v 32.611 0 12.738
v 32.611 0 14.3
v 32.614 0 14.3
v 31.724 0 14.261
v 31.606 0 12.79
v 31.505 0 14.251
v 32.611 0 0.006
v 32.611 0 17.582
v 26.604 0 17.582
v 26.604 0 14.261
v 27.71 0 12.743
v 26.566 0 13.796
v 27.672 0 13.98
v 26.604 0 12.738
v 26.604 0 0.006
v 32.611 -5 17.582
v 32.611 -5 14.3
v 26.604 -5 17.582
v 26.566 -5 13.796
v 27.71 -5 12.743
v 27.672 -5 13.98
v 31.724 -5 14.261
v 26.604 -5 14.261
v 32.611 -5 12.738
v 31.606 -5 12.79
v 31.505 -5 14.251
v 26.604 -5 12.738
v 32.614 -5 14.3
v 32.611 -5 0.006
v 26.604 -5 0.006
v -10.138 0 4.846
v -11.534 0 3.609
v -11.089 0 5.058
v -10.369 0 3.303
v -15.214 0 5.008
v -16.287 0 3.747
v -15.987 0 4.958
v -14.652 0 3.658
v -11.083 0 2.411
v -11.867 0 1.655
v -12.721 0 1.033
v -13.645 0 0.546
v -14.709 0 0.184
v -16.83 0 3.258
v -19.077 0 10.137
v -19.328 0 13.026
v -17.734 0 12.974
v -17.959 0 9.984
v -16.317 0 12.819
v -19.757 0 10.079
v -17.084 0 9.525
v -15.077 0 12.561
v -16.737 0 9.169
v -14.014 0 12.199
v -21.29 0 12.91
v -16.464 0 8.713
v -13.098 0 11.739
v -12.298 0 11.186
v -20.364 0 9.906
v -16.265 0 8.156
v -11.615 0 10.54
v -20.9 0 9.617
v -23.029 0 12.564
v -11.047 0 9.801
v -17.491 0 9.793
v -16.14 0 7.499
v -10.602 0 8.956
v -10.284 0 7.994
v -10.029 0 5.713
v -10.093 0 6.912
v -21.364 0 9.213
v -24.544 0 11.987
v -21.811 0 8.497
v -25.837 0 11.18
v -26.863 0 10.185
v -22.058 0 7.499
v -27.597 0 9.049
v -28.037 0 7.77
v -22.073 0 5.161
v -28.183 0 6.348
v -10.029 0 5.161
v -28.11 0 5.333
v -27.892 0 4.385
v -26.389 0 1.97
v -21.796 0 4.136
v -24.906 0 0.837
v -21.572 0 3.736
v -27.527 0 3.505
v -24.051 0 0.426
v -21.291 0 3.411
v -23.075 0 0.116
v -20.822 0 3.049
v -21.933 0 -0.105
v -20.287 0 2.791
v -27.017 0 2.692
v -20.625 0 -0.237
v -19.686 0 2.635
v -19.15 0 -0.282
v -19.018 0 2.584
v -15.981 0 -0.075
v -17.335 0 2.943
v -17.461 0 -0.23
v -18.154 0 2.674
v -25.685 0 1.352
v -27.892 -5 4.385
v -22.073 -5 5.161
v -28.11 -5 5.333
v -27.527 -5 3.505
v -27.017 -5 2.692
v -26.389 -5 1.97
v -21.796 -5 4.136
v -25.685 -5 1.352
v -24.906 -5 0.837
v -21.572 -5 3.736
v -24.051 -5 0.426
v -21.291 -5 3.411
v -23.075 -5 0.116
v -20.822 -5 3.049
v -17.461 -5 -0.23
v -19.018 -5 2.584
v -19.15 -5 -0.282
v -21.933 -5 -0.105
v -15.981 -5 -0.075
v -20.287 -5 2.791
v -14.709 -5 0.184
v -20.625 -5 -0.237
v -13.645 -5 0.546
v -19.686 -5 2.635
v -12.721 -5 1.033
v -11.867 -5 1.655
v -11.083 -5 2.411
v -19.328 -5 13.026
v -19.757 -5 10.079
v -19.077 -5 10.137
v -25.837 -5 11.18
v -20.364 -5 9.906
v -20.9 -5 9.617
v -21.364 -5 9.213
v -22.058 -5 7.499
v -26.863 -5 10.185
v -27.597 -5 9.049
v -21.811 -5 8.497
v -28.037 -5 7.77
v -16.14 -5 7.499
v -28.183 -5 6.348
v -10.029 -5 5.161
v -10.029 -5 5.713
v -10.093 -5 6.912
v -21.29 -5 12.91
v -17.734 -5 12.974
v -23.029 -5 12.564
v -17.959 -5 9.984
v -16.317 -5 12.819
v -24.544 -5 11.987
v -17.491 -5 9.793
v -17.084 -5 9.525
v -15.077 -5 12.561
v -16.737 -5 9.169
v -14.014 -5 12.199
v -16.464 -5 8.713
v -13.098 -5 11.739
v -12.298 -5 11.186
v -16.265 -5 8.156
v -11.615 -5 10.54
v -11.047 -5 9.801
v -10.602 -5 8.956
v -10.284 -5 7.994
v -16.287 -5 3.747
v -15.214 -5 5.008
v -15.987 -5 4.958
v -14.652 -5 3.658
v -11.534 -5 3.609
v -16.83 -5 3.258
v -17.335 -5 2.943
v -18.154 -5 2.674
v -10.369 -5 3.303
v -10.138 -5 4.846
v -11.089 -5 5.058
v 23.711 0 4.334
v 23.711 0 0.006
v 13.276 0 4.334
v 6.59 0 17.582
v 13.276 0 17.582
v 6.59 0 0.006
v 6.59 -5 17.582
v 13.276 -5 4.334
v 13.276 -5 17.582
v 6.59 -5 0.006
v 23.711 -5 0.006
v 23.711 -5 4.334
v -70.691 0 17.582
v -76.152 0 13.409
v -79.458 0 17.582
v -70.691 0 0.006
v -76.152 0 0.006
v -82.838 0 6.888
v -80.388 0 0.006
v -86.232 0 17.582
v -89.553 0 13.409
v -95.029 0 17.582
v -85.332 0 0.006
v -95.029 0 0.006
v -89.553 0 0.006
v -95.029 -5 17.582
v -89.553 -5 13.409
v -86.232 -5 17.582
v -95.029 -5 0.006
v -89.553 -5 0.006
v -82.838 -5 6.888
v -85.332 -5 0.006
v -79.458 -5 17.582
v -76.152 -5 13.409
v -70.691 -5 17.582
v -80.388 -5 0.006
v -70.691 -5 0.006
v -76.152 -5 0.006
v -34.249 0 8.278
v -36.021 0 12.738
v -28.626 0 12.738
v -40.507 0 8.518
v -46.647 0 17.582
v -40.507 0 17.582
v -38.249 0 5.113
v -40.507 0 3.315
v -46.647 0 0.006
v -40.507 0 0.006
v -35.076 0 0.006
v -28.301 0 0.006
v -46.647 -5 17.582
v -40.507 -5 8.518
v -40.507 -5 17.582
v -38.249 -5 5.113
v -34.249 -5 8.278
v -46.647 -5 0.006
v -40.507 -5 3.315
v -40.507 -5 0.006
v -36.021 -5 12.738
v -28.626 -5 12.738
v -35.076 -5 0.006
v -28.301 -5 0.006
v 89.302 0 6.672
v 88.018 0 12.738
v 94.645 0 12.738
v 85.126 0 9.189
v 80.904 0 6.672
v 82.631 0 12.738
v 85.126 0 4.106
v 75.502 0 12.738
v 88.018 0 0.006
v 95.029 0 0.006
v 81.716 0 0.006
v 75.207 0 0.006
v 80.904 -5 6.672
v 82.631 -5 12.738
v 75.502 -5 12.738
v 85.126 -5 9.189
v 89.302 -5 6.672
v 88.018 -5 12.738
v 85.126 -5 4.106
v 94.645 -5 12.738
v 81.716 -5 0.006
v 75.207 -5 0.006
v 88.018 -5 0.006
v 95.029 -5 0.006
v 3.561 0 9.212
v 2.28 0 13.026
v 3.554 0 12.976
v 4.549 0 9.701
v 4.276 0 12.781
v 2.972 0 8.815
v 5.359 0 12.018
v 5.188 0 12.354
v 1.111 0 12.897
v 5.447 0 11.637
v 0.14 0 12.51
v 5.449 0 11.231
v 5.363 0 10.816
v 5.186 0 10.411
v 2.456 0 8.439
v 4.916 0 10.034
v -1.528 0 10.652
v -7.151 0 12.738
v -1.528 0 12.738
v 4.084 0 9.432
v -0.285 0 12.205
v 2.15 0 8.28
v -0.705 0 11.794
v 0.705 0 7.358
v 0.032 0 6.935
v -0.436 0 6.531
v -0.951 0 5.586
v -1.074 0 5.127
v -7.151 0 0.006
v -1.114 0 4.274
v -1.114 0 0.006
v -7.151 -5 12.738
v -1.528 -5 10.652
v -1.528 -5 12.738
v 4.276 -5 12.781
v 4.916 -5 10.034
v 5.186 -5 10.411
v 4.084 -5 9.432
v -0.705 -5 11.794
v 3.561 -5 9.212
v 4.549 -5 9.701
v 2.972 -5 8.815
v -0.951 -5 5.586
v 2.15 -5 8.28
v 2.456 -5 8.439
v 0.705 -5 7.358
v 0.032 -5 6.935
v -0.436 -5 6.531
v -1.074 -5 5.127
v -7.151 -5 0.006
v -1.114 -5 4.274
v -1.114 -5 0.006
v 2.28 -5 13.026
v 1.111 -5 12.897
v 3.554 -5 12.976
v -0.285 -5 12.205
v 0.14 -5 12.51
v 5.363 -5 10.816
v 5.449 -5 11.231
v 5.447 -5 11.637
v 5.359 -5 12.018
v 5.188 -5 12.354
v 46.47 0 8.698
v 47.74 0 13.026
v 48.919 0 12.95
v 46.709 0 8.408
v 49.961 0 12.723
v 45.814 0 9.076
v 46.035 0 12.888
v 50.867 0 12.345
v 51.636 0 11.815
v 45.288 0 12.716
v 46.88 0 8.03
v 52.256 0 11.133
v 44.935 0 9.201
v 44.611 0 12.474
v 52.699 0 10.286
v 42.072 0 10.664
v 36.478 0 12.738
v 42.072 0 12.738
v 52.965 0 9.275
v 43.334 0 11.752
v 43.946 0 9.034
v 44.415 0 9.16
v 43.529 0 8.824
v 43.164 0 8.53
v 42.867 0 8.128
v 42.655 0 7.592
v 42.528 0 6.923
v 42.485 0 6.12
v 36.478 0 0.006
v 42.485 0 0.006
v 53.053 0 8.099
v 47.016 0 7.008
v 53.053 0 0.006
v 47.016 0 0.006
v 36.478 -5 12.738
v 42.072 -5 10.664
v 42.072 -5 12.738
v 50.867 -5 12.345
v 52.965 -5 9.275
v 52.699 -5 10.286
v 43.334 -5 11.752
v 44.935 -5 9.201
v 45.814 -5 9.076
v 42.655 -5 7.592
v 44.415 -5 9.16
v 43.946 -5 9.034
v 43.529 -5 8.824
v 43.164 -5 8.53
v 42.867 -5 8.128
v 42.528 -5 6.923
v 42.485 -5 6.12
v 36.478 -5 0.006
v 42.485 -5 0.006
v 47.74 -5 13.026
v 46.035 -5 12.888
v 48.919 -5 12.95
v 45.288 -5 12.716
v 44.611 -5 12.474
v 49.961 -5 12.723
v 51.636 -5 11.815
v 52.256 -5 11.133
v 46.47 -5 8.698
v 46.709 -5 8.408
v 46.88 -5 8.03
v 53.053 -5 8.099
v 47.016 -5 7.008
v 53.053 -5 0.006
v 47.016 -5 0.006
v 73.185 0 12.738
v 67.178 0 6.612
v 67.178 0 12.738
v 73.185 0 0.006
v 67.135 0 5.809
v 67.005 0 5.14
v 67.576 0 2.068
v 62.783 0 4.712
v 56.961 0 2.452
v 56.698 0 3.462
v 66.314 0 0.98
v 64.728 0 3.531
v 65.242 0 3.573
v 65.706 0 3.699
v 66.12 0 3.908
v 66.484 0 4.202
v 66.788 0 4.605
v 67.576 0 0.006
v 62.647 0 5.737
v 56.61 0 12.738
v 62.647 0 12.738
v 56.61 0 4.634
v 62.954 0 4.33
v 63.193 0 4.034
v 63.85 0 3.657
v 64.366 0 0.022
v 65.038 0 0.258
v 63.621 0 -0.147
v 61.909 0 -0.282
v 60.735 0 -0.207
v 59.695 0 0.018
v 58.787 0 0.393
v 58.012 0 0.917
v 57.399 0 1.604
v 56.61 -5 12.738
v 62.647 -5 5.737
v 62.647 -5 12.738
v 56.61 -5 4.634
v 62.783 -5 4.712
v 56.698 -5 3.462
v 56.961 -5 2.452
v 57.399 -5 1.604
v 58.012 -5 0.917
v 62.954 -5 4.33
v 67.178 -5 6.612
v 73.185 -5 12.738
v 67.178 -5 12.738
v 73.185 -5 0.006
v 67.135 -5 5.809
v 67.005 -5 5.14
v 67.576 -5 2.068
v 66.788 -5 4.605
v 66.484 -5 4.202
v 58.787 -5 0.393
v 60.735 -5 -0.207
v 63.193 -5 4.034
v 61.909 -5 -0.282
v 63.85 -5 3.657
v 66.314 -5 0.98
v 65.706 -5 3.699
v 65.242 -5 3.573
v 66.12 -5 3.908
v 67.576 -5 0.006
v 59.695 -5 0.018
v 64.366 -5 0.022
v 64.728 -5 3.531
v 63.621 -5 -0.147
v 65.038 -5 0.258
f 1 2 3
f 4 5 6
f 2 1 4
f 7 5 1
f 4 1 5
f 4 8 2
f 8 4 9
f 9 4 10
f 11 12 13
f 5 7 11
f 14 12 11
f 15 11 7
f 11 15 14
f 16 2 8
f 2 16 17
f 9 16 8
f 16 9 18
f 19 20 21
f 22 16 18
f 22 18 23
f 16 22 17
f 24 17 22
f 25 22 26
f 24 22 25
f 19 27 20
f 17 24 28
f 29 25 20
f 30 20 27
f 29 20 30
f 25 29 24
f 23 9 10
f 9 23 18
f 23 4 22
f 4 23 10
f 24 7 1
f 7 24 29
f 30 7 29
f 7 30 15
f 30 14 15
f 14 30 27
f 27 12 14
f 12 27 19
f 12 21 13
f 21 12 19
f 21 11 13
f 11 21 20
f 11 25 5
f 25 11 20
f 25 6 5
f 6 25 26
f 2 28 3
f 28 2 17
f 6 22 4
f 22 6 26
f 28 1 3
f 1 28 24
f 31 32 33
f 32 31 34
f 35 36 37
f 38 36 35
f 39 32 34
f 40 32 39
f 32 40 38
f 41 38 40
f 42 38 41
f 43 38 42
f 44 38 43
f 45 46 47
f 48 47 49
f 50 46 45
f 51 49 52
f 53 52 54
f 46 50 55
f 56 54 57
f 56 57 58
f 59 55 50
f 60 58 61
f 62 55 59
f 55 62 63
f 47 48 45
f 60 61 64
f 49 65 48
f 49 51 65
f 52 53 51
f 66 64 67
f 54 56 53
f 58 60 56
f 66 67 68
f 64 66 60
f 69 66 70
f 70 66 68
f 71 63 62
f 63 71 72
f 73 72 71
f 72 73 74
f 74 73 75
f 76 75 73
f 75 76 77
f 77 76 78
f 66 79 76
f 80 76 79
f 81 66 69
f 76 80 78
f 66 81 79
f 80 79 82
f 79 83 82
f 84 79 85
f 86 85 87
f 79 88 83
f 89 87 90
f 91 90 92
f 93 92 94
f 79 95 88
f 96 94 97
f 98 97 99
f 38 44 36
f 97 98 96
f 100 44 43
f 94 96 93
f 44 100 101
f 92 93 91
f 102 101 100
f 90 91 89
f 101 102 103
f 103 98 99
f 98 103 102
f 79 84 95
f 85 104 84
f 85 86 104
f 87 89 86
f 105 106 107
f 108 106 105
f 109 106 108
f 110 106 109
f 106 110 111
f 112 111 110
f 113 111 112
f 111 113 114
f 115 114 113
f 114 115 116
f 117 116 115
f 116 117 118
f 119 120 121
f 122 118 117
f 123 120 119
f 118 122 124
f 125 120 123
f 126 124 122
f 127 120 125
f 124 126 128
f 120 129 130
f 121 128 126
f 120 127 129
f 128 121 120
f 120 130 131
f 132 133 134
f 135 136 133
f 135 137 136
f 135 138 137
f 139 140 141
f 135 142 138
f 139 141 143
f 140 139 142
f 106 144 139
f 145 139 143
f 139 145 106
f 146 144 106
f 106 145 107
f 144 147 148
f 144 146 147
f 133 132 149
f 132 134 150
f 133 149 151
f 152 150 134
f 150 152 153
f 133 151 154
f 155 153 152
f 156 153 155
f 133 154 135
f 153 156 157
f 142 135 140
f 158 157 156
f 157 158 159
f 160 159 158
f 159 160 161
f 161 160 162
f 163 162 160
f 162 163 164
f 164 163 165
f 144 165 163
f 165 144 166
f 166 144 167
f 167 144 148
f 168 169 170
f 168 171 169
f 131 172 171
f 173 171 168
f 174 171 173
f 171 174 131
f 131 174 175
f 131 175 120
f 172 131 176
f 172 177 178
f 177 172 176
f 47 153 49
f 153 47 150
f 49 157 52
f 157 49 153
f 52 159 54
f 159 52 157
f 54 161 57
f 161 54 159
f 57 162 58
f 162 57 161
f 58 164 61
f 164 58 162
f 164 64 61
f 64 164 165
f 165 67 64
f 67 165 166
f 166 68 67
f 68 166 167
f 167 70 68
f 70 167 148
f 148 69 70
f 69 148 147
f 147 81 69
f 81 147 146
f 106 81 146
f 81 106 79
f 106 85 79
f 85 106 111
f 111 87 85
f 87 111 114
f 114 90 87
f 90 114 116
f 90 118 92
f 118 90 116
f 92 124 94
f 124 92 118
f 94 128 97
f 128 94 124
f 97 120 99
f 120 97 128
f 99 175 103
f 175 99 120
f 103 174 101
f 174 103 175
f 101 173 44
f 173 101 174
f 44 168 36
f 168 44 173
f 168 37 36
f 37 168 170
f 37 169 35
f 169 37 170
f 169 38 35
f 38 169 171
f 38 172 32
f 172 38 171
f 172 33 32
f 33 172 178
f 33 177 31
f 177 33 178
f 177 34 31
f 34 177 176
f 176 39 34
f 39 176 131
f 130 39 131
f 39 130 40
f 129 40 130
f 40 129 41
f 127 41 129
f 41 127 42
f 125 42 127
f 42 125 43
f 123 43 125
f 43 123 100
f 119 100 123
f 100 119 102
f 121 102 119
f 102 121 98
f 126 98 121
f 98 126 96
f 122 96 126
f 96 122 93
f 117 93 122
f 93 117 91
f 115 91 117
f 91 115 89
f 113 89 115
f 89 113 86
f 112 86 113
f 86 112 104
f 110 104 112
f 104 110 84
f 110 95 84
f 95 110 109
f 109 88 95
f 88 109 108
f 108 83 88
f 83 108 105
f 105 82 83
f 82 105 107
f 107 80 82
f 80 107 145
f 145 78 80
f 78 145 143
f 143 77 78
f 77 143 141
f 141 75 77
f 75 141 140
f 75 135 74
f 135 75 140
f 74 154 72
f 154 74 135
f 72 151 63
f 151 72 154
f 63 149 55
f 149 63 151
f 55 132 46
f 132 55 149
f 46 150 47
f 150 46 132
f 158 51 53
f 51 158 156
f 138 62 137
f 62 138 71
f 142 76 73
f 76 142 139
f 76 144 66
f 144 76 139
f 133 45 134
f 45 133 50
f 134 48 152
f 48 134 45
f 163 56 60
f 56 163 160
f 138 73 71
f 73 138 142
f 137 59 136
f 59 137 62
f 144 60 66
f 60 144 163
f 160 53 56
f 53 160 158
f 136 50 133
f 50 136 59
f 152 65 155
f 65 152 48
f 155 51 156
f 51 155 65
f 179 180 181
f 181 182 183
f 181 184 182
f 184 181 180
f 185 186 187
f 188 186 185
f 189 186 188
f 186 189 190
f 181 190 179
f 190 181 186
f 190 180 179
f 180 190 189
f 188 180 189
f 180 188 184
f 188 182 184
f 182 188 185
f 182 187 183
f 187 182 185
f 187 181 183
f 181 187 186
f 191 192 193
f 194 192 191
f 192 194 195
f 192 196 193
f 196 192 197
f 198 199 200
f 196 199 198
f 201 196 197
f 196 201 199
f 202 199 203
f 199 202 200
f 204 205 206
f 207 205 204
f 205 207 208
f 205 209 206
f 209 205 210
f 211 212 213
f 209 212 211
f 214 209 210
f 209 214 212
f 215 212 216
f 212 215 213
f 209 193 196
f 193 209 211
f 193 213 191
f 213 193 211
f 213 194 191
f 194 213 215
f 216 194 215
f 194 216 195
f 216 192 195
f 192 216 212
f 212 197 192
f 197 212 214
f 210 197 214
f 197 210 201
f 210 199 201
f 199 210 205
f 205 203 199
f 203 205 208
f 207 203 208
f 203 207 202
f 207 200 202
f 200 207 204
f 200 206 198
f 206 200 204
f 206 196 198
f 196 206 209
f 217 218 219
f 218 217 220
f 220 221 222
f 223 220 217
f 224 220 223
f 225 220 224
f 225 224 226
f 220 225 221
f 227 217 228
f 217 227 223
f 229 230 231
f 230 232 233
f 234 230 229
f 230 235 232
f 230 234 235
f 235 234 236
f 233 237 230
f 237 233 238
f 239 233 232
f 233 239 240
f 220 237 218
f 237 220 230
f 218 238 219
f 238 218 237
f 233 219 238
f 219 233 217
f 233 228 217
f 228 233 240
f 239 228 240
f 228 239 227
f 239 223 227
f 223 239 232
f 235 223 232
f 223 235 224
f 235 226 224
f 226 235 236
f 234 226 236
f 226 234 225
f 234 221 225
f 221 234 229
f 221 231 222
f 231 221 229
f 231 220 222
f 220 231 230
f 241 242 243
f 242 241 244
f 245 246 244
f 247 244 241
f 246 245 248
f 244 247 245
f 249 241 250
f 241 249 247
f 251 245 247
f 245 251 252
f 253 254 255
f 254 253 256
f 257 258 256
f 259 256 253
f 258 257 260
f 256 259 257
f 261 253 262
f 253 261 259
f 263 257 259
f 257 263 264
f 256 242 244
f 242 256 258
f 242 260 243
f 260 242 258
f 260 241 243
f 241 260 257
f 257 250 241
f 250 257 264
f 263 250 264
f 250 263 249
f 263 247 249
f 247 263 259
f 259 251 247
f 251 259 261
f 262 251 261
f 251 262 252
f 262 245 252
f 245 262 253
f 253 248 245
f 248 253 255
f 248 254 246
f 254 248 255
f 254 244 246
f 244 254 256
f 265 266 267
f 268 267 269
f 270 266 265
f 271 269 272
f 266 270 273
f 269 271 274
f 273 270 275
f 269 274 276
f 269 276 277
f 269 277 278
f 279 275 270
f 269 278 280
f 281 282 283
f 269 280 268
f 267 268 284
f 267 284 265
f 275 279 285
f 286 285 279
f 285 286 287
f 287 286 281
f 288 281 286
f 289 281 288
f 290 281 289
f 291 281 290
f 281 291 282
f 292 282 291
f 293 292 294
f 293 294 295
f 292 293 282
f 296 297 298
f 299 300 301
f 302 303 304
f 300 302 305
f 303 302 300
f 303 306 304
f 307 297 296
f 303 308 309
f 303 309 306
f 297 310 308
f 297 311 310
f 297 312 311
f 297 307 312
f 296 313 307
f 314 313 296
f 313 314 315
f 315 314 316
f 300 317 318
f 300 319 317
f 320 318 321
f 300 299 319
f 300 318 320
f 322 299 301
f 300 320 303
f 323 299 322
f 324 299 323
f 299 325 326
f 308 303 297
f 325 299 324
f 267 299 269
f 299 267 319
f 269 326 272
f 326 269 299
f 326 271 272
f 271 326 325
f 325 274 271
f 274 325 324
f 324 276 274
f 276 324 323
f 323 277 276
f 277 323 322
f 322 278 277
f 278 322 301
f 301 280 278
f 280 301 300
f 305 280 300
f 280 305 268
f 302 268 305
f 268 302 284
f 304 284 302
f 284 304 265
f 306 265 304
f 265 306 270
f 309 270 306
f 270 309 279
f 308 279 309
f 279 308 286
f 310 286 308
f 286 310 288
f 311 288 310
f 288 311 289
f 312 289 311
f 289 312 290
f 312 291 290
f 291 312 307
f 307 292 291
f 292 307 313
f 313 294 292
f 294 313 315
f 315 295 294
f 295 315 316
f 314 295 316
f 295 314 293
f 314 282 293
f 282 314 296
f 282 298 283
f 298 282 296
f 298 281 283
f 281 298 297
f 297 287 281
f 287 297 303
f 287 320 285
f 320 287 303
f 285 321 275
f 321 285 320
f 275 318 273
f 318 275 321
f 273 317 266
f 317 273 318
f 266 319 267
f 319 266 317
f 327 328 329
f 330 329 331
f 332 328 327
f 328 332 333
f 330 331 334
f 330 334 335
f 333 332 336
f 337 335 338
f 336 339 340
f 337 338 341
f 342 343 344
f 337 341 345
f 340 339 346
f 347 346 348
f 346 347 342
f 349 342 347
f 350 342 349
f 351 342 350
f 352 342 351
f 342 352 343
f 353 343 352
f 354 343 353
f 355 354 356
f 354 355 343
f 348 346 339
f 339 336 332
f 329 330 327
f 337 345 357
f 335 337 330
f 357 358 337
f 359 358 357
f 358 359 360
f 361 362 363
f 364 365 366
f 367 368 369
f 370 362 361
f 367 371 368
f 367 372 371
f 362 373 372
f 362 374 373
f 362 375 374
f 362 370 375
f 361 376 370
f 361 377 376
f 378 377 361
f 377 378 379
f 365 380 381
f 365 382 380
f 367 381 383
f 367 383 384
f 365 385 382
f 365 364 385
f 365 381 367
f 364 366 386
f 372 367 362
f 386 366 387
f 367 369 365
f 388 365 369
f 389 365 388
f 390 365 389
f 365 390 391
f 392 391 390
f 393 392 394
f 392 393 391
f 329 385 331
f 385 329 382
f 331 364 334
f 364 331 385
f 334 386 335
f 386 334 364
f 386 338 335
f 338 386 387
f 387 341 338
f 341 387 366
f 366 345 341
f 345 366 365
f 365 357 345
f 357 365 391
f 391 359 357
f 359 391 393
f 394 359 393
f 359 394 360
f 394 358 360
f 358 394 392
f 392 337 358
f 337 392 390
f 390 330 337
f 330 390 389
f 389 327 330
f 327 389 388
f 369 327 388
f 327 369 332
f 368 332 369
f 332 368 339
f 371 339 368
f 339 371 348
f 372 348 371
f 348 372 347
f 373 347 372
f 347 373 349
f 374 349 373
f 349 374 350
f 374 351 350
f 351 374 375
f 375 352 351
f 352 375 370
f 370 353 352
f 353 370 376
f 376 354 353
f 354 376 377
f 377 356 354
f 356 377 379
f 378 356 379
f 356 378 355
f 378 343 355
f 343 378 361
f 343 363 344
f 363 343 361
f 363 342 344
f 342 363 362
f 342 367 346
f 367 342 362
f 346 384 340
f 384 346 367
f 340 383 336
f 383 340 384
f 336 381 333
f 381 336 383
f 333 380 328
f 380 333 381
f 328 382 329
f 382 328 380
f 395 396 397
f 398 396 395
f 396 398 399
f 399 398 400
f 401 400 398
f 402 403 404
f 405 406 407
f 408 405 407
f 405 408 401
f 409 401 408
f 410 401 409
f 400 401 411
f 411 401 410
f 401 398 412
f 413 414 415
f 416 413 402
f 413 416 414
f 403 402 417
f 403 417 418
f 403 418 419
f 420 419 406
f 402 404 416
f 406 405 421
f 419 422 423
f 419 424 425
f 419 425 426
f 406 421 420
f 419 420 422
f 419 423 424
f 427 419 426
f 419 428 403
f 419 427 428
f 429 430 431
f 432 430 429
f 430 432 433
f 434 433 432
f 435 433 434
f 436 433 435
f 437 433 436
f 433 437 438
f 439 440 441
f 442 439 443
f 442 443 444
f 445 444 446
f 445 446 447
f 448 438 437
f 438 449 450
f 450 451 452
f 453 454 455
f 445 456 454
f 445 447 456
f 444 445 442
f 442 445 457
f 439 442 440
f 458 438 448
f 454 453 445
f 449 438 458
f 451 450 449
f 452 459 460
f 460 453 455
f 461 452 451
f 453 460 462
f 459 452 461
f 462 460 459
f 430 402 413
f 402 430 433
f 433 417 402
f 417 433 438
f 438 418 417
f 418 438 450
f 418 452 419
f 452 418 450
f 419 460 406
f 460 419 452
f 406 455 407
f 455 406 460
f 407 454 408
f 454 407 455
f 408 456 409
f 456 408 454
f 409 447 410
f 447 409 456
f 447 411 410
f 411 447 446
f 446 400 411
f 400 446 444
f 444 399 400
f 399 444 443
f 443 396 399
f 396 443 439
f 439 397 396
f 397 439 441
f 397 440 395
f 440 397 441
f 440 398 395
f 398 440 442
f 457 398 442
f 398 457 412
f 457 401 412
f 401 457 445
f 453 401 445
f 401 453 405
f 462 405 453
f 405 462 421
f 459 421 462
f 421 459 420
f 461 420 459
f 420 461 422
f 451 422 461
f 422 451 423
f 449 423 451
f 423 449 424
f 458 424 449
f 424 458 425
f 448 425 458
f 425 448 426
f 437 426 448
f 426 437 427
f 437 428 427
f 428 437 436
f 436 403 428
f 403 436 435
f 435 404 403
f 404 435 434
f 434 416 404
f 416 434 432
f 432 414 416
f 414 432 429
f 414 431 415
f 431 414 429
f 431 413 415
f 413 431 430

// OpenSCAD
$fn=30;
// Module names are of the form poly_<inkscape-path-id>().  As a result,
// you can associate a polygon in this OpenSCAD program with the corresponding
// SVG element in the Inkscape document by looking for the XML element with
// the attribute id="inkscape-path-id".

// fudge value is used to ensure that subtracted solids are a tad taller
// in the z dimension than the polygon being subtracted from.  This helps
// keep the resulting .stl file manifold.
fudge = 0.1;

module poly_path3760(h)
{
  scale([25.4/90, -25.4/90, 1]) union()
  {
    difference()
    {
       linear_extrude(height=h)
         polygon([[-222.225070,2.147745],[-237.770581,-1.614210],[-236.371625,-5.479807],[-234.475838,-8.410913],[-231.808672,-10.747248],[-228.200136,-12.743814],[-224.722368,-13.911959],[-220.146317,-14.782818],[-214.811999,-15.324396],[-209.059257,-15.504968],[-200.430199,-15.281919],[-193.683786,-14.612904],[-188.362558,-13.285389],[-186.064728,-12.263238],[-184.008754,-11.002153],[-181.576964,-8.686999],[-179.720354,-5.564798],[-178.543713,-2.155801],[-178.151434,1.104468],[-178.151434,21.027293],[-177.680758,26.039859],[-175.484259,30.627636],[-195.461903,30.627636],[-197.030823,27.993920],[-197.762989,25.105319],[-201.933750,27.908959],[-206.078298,29.778048],[-212.184054,31.179865],[-219.204966,31.647138],[-223.875797,31.413501],[-227.951736,30.712593],[-231.432785,29.544412],[-234.318946,27.908958],[-236.561202,25.931014],[-238.162813,23.735362],[-239.123778,21.322001],[-239.444100,18.690929],[-239.212030,16.235101],[-238.515820,14.007592],[-237.355468,12.008404],[-235.730974,10.237535],[-233.127059,8.134623],[-229.312517,5.581188],[-224.713506,3.240143],[-222.253000,2.356427],[-219.756185,1.774399],[-214.649511,1.226852],[-211.021475,1.254127],[-208.445915,1.430078],[-206.496669,1.328556],[-202.835879,1.035999],[-200.927014,0.920466],[-198.965831,0.509755],[-199.371172,-2.198281],[-199.877797,-3.193895],[-200.587056,-3.950574],[-202.822807,-4.906336],[-206.287484,-5.224961],[-210.863536,-4.885098],[-214.132106,-3.865622],[-214.380181,-3.516652],[-214.195337,-3.020495],[-213.071427,-1.704991],[-211.849448,-0.155865],[-211.542018,0.632321],[-211.618472,1.390130]]);
       translate([0, 0, -fudge])
         linear_extrude(height=h+2*fudge)
           polygon([[-198.965831,9.218034],[-208.117894,11.469437],[-213.413042,12.860651],[-216.328605,14.230599],[-217.662209,15.728007],[-218.106722,17.416552],[-217.675282,19.275029],[-216.380898,20.772418],[-214.197505,21.728213],[-211.203452,22.046804],[-207.777991,21.696355],[-204.613965,20.644980],[-201.986045,19.094495],[-200.273272,17.246629],[-199.292725,14.910279],[-198.965831,11.979187]]);
    }
  }
}

module poly_path3768(h)
{
  scale([25.4/90, -25.4/90, 1]) union()
  {
    linear_extrude(height=h)
      polygon([[23.350848,-31.647138],[47.041617,-31.647138],[47.041617,15.292577],[84.015946,15.292577],[84.015946,30.627636],[23.350848,30.627636]]);
  }
}

module poly_path3758(h)
{
  scale([25.4/90, -25.4/90, 1]) union()
  {
    linear_extrude(height=h)
      polygon([[-336.717446,-31.647138],[-305.548137,-31.647138],[-293.519712,6.244471],[-281.543585,-31.647138],[-250.478871,-31.647138],[-250.478871,30.627636],[-269.828945,30.627636],[-269.828945,-16.864307],[-284.838328,30.627636],[-302.357990,30.627636],[-317.315074,-16.864307],[-317.315074,30.627636],[-336.717446,30.627636],[-336.717446,-31.647138]]);
  }
}

module poly_path3770(h)
{
  scale([25.4/90, -25.4/90, 1]) union()
  {
    linear_extrude(height=h)
      polygon([[94.266230,-31.647138],[115.551304,-31.647138],[115.551304,-19.880345],[94.266230,-19.880345]]);
    linear_extrude(height=h)
      polygon([[94.266230,-14.485466],[94.131995,-18.235470],[98.051466,-18.887538],[98.183925,-14.502671],[111.989201,-14.669403],[111.631434,-19.845710],[115.560568,-20.021184],[115.551692,-14.485466],[115.551692,30.627636],[94.266619,30.627636],[94.266619,-14.485466]]);
  }
}

module poly_path3762(h)
{
  scale([25.4/90, -25.4/90, 1]) union()
  {
    linear_extrude(height=h)
      polygon([[-165.286246,-31.647138],[-143.530486,-31.647138],[-143.530486,0.467279],[-127.632045,-14.485466],[-101.430993,-14.485466],[-121.356343,1.316867],[-100.280455,30.627636],[-124.285008,30.627636],[-135.528972,12.531424],[-143.530486,18.903328],[-143.530486,30.627636],[-165.286246,30.627636],[-165.286246,-31.647138]]);
  }
}

module poly_path3776(h)
{
  scale([25.4/90, -25.4/90, 1]) union()
  {
    linear_extrude(height=h)
      polygon([[267.527865,-14.485466],[292.787554,-14.485466],[301.625832,-1.911570],[311.876139,-14.485466],[335.357711,-14.485466],[316.426018,7.009098],[336.717446,30.627636],[311.876139,30.627636],[301.625832,16.099689],[289.545104,30.627636],[266.481914,30.627636],[286.668744,7.009098]]);
  }
}

module poly_path3766(h)
{
  scale([25.4/90, -25.4/90, 1]) union()
  {
    linear_extrude(height=h)
      polygon([[-25.338131,-14.485466],[-5.412781,-14.485466],[-5.412781,-7.094050],[-2.497219,-11.140183],[-1.010004,-12.597763],[0.496833,-13.678354],[3.935368,-15.048281],[8.079976,-15.504968],[12.592364,-15.327822],[15.150066,-14.638151],[18.382576,-13.126127],[18.987981,-11.932268],[19.299182,-10.583801],[19.306957,-9.143675],[19.002084,-7.674839],[18.375340,-6.240244],[17.417503,-4.902839],[16.119351,-3.725573],[14.471660,-2.771397],[12.616463,-1.989599],[10.530801,-0.585244],[8.701879,0.746727],[7.616900,1.311369],[2.497500,4.579272],[0.115046,6.077613],[-1.546569,7.507871],[-3.370319,10.857455],[-3.806716,12.483258],[-3.948459,15.504977],[-3.948459,30.627636],[-25.338131,30.627636],[-25.338131,-14.485466]]);
  }
}

module poly_path3772(h)
{
  scale([25.4/90, -25.4/90, 1]) union()
  {
    linear_extrude(height=h)
      polygon([[129.253267,-14.485466],[149.074019,-14.485466],[149.074019,-7.136536],[153.545433,-10.991506],[158.069190,-13.550916],[160.468317,-14.405790],[163.115869,-15.016422],[169.156261,-15.504968],[173.333496,-15.236791],[177.026997,-14.432329],[180.236764,-13.091582],[182.962801,-11.214552],[185.159263,-8.798514],[186.728176,-5.798402],[187.669540,-2.214213],[187.983356,1.954056],[187.983356,30.627636],[166.593685,30.627636],[166.593685,5.819682],[166.109900,2.198335],[165.505219,0.857574],[164.658676,-0.169909],[162.331409,-1.507989],[159.219739,-1.954047],[157.376234,-1.805349],[155.715782,-1.359311],[154.238383,-0.615930],[152.944036,0.424794],[151.891534,1.850528],[151.139751,3.748831],[150.688689,6.119705],[150.538352,8.963149],[150.538352,30.627636],[129.253267,30.627636]]);
  }
}

module poly_path3774(h)
{
  scale([25.4/90, -25.4/90, 1]) union()
  {
    linear_extrude(height=h)
      polygon([[259.317154,30.627636],[239.444097,30.627636],[239.444097,23.321182],[234.972634,27.176190],[230.448927,29.735572],[228.069373,30.571882],[225.428345,31.169246],[219.361866,31.647138],[215.204204,31.381642],[211.517228,30.585156],[208.300936,29.257678],[205.555326,27.399207],[203.381706,24.967265],[201.829122,21.961850],[200.897575,18.382961],[200.587065,14.230599],[200.587065,-14.485466],[221.976737,-14.485466],[221.976737,10.322497],[222.460471,13.954494],[223.065165,15.308519],[223.911745,16.354565],[226.238962,17.692674],[229.350683,18.138702],[231.171270,17.990030],[232.815365,17.543998],[234.282971,16.800607],[235.574091,15.759852],[236.649433,14.334149],[237.417543,12.435855],[237.878421,10.064972],[238.032069,7.221497],[238.032069,-14.485466],[259.317154,-14.485466],[259.317154,30.627636]]);
  }
}

module poly_path3764(h)
{
  scale([25.4/90, -25.4/90, 1]) union()
  {
    difference()
    {
       linear_extrude(height=h)
         polygon([[-35.536144,12.361501],[-78.210911,12.361501],[-77.230346,15.993503],[-76.436072,17.411249],[-75.439137,18.563491],[-73.778708,19.845843],[-71.882929,20.761806],[-69.751799,21.311381],[-67.385319,21.494568],[-64.325950,21.175982],[-61.423412,20.220191],[-59.632254,19.105115],[-57.710286,17.374066],[-56.647315,13.083128],[-53.907886,12.904535],[-51.915757,17.689542],[-40.867198,17.861439],[-39.291033,12.727681],[-35.922415,13.480078],[-36.738986,18.945805],[-39.268913,22.105213],[-42.047231,24.786726],[-45.073939,26.990342],[-48.349038,28.716061],[-52.117750,29.998407],[-56.625148,30.914368],[-61.871233,31.463945],[-67.856006,31.647138],[-73.079230,31.490496],[-77.714098,31.020570],[-81.760610,30.237359],[-85.218768,29.140859],[-88.248766,27.683286],[-91.010730,25.859330],[-93.504663,23.668987],[-95.730565,21.112255],[-97.538101,18.231629],[-98.829197,15.112052],[-99.603854,11.753525],[-99.862073,8.156046],[-99.342367,3.119600],[-97.783248,-1.412413],[-95.184715,-5.439995],[-91.546764,-8.963149],[-86.967478,-11.825168],[-81.597184,-13.869478],[-75.435883,-15.096078],[-68.483574,-15.504968],[-62.835468,-15.321750],[-57.814915,-14.772165],[-53.421915,-13.856212],[-49.656468,-12.573891],[-46.410790,-10.943725],[-43.576932,-8.984357],[-41.154893,-6.695786],[-39.144671,-4.078012],[-37.565978,-1.085858],[-36.438325,2.325769],[-35.761714,6.156871],[-35.536144,10.407449],[-35.536144,12.361501]]);
       translate([0, 0, -fudge])
         linear_extrude(height=h+2*fudge)
           polygon([[-57.187317,4.078021],[-57.631866,1.749638],[-58.337890,-0.222990],[-59.305387,-1.839865],[-60.534353,-3.100986],[-61.975823,-4.048788],[-63.633008,-4.725797],[-67.594515,-5.267437],[-70.003484,-5.062984],[-72.157493,-4.449681],[-74.056541,-3.427527],[-75.700628,-1.996523],[-77.282645,0.541640],[-78.158606,4.078021],[-57.187317,4.078021]]);
    }
  }
}

module makerlinux(h) {
  rotate([90,0,0]) {
    poly_path3760(h); // a
    poly_path3768(h); // L
    poly_path3758(h); // M
    poly_path3770(h); // i
    poly_path3762(h); // k
    poly_path3776(h); // x
    poly_path3766(h); // r
    poly_path3772(h); // n
    poly_path3774(h); // u
    poly_path3764(h); // e
  }
}

translate([0,0,8.65]) makerlinux(5);
